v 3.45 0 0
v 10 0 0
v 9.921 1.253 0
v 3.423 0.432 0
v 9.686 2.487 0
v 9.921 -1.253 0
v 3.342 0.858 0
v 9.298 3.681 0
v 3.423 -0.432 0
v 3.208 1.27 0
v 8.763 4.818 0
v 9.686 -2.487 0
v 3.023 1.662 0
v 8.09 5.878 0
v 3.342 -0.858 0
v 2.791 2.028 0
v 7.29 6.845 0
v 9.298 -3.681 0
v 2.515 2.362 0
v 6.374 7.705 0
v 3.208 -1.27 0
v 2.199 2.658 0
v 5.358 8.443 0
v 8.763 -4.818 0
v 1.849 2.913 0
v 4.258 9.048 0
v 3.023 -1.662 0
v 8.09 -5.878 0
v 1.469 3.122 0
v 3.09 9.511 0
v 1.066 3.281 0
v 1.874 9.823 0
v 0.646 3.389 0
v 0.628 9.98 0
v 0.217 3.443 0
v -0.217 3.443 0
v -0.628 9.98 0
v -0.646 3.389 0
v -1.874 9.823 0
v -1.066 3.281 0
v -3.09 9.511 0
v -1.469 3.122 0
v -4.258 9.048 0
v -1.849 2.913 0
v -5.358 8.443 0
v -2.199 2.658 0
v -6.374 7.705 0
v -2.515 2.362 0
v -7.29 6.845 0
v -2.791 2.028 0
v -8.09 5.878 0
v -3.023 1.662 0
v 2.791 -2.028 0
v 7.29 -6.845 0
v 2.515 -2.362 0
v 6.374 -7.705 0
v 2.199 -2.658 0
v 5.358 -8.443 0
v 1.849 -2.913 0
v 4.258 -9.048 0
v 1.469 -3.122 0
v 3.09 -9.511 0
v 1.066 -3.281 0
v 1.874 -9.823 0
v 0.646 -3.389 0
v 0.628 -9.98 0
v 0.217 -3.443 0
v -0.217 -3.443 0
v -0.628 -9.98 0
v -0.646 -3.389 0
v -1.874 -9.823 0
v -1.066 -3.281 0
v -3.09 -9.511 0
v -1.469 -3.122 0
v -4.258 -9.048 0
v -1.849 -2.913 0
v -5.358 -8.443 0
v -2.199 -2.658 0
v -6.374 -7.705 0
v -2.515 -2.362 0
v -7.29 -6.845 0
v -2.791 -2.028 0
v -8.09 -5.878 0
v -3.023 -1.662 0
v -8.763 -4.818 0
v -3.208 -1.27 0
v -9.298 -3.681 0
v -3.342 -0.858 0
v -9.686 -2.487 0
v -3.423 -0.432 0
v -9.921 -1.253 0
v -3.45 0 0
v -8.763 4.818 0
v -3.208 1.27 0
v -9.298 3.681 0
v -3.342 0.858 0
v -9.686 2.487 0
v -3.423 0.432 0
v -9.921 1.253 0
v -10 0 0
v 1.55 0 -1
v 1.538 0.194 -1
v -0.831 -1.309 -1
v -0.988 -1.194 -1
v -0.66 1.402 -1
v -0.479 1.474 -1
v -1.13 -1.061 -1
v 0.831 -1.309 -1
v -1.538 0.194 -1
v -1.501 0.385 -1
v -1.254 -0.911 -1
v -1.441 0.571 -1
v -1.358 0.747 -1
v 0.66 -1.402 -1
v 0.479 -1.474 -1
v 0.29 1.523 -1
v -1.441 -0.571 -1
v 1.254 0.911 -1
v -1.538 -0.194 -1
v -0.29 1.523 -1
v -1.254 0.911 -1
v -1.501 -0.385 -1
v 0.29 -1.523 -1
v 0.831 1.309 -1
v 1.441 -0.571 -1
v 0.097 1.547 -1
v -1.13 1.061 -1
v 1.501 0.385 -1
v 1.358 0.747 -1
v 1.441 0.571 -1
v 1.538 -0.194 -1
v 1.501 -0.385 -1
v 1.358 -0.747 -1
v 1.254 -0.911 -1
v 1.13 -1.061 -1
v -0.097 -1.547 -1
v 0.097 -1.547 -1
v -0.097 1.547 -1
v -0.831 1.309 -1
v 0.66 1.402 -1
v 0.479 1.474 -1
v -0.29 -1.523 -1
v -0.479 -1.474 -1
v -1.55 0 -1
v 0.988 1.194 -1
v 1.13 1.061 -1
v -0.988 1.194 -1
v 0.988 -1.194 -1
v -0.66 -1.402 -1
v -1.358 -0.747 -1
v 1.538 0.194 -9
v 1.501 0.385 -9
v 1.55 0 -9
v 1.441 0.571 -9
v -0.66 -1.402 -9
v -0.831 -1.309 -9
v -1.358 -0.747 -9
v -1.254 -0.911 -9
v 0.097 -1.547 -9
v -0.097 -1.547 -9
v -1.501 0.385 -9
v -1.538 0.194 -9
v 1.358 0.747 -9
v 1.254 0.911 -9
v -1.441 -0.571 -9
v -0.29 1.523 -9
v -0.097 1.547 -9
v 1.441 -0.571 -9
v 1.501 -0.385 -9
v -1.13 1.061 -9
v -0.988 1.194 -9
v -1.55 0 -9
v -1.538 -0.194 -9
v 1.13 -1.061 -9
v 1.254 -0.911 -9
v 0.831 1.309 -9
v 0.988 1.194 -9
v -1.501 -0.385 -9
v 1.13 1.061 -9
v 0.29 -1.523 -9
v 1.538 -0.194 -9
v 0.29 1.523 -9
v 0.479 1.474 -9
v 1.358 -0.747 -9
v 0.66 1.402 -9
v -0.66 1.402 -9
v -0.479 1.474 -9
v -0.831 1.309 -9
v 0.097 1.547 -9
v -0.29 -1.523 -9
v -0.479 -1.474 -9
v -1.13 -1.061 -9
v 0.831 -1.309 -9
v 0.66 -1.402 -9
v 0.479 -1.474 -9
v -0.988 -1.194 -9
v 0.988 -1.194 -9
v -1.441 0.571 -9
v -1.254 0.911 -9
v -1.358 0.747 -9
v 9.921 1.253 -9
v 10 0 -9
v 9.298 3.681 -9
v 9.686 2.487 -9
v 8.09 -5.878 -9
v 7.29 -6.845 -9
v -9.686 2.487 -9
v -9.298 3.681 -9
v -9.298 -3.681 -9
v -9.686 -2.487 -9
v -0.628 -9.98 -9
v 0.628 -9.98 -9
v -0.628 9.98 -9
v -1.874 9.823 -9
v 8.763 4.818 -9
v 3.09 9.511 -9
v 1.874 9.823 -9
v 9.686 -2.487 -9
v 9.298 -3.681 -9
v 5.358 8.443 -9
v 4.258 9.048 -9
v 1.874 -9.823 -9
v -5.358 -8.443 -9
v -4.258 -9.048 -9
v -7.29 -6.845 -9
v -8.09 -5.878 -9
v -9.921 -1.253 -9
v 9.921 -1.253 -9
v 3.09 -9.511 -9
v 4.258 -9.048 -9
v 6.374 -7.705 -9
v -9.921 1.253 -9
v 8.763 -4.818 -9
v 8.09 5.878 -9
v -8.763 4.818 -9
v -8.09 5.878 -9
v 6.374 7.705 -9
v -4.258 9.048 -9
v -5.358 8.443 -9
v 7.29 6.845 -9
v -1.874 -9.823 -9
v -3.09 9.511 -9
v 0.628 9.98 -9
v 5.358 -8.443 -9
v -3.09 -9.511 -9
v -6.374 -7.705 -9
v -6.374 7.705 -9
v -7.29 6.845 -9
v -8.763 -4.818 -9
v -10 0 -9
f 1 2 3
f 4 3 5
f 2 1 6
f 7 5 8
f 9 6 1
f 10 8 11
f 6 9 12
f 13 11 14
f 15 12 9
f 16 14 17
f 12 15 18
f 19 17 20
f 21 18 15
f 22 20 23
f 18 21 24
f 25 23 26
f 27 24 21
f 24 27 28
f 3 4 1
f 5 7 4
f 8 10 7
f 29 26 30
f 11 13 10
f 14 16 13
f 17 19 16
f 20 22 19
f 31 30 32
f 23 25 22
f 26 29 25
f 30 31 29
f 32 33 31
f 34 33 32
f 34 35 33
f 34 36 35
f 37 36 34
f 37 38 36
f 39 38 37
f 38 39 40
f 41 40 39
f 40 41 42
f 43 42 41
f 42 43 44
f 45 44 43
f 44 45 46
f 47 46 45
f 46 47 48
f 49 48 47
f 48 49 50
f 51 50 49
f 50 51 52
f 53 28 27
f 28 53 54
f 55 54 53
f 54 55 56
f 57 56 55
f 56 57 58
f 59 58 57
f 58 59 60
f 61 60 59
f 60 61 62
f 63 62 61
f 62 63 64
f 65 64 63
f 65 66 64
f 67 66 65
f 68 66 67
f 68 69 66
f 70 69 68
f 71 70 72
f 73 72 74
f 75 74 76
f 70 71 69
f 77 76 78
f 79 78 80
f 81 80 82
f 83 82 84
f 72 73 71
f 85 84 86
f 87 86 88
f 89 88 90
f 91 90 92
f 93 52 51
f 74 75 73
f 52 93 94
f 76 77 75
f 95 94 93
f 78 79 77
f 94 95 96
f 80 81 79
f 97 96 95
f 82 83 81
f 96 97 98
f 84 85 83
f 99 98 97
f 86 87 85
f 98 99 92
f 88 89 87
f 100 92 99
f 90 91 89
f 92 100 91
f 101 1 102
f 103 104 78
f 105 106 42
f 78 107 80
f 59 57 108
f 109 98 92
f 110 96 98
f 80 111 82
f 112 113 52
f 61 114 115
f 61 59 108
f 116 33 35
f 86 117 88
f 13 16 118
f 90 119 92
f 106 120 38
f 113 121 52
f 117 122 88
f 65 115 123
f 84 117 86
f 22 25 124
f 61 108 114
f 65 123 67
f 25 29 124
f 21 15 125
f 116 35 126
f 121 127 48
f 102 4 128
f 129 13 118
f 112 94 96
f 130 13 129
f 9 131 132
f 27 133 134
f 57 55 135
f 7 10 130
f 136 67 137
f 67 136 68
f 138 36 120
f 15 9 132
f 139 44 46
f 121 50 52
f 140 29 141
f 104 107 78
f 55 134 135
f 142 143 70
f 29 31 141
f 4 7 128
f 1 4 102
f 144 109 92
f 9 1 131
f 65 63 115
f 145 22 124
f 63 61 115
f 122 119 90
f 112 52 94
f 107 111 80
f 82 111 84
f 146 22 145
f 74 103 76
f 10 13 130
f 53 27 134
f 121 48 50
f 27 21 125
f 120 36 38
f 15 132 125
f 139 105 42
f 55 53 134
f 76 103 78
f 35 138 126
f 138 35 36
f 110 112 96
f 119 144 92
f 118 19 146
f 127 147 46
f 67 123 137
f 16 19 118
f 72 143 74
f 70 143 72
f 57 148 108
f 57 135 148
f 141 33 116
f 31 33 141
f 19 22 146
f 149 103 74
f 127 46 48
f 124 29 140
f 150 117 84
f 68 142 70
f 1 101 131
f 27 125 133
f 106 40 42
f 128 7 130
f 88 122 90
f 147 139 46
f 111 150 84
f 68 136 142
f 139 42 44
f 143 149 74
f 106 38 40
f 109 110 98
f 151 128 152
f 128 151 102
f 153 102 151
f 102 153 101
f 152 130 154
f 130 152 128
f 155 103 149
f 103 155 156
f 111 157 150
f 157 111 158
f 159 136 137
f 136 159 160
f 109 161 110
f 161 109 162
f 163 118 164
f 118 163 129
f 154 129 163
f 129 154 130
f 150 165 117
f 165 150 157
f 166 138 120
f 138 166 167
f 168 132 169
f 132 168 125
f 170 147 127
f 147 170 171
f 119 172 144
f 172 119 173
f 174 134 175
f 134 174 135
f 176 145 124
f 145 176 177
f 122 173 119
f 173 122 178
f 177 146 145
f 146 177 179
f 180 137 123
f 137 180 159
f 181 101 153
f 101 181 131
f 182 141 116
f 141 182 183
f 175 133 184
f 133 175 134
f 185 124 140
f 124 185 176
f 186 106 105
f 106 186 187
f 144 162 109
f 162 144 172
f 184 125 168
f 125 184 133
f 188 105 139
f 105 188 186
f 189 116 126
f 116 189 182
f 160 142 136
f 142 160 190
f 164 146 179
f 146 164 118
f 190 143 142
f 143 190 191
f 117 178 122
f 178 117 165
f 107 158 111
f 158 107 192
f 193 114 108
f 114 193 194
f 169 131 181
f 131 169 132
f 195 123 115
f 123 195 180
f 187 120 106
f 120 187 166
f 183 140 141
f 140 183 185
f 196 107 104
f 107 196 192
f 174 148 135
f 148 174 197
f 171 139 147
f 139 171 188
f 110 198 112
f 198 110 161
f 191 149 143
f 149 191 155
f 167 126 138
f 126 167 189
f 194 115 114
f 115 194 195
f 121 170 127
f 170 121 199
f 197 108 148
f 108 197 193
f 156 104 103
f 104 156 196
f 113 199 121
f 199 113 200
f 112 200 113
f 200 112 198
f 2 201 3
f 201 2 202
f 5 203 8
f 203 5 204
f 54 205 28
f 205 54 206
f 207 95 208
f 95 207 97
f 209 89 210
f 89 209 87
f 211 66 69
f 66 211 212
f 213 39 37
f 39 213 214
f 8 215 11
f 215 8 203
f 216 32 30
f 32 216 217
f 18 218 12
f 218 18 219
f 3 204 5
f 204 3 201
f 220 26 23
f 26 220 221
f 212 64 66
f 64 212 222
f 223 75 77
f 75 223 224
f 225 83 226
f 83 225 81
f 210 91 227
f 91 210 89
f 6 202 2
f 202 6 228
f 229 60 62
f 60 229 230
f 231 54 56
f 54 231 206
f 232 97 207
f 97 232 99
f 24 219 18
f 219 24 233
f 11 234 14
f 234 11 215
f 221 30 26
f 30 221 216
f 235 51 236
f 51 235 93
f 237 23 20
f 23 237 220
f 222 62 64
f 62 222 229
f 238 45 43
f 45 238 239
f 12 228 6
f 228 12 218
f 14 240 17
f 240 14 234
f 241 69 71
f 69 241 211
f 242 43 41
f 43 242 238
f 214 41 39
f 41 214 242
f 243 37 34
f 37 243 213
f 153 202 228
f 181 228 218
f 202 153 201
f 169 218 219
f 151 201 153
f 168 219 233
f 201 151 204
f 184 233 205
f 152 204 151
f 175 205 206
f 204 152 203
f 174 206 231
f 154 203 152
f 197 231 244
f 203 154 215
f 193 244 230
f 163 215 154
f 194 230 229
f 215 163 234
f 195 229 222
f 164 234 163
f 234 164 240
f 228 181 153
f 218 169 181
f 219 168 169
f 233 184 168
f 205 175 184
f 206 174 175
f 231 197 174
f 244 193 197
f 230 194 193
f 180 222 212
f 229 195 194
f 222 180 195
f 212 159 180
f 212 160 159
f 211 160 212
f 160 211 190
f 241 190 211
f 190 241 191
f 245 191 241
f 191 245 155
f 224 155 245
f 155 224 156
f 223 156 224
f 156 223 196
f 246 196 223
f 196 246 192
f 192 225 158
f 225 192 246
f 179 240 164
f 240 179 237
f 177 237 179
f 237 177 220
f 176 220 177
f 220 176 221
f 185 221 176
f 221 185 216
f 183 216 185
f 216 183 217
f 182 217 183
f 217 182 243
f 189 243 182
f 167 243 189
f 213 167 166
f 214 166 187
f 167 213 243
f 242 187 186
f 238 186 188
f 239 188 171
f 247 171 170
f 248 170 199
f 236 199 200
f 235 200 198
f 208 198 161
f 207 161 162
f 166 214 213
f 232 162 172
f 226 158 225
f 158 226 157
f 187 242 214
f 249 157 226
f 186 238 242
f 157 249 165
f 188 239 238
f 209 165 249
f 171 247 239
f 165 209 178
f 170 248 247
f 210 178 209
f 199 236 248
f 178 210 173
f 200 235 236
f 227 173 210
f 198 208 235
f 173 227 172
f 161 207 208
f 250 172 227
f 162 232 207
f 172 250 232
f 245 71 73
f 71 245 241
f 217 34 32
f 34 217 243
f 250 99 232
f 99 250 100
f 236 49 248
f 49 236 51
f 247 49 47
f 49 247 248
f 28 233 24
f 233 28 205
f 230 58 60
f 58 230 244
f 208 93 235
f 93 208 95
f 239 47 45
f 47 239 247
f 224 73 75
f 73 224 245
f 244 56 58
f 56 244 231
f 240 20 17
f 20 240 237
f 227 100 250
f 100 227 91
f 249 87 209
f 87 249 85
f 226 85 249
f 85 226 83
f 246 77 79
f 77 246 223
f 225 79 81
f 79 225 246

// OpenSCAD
$fn = 50;

difference() {
	union() {
		translate(v = [0, 0, -9.0]) {
			cylinder(h = 9, r = 10.0);
		}
	}
	union() {
		translate(v = [0, 0, 0]) {
			rotate(a = [0, 0, 0]) {
				difference() {
					union() {
						translate(v = [0, 0, -12.0]) {
							cylinder(h = 12, r = 1.25);
						}
						translate(v = [0, 0, -1.0]) {
							cylinder(h = 1.0, r1 = 1.55, r2 = 3.45);
						}
						translate(v = [0, 0, -12.0]) {
							cylinder(h = 12, r = 1.55);
						}
						translate(v = [0, 0, -12.0]) {
							cylinder(h = 12, r = 1.25);
						}
					}
					union();
				}
			}
		}
	}
}
